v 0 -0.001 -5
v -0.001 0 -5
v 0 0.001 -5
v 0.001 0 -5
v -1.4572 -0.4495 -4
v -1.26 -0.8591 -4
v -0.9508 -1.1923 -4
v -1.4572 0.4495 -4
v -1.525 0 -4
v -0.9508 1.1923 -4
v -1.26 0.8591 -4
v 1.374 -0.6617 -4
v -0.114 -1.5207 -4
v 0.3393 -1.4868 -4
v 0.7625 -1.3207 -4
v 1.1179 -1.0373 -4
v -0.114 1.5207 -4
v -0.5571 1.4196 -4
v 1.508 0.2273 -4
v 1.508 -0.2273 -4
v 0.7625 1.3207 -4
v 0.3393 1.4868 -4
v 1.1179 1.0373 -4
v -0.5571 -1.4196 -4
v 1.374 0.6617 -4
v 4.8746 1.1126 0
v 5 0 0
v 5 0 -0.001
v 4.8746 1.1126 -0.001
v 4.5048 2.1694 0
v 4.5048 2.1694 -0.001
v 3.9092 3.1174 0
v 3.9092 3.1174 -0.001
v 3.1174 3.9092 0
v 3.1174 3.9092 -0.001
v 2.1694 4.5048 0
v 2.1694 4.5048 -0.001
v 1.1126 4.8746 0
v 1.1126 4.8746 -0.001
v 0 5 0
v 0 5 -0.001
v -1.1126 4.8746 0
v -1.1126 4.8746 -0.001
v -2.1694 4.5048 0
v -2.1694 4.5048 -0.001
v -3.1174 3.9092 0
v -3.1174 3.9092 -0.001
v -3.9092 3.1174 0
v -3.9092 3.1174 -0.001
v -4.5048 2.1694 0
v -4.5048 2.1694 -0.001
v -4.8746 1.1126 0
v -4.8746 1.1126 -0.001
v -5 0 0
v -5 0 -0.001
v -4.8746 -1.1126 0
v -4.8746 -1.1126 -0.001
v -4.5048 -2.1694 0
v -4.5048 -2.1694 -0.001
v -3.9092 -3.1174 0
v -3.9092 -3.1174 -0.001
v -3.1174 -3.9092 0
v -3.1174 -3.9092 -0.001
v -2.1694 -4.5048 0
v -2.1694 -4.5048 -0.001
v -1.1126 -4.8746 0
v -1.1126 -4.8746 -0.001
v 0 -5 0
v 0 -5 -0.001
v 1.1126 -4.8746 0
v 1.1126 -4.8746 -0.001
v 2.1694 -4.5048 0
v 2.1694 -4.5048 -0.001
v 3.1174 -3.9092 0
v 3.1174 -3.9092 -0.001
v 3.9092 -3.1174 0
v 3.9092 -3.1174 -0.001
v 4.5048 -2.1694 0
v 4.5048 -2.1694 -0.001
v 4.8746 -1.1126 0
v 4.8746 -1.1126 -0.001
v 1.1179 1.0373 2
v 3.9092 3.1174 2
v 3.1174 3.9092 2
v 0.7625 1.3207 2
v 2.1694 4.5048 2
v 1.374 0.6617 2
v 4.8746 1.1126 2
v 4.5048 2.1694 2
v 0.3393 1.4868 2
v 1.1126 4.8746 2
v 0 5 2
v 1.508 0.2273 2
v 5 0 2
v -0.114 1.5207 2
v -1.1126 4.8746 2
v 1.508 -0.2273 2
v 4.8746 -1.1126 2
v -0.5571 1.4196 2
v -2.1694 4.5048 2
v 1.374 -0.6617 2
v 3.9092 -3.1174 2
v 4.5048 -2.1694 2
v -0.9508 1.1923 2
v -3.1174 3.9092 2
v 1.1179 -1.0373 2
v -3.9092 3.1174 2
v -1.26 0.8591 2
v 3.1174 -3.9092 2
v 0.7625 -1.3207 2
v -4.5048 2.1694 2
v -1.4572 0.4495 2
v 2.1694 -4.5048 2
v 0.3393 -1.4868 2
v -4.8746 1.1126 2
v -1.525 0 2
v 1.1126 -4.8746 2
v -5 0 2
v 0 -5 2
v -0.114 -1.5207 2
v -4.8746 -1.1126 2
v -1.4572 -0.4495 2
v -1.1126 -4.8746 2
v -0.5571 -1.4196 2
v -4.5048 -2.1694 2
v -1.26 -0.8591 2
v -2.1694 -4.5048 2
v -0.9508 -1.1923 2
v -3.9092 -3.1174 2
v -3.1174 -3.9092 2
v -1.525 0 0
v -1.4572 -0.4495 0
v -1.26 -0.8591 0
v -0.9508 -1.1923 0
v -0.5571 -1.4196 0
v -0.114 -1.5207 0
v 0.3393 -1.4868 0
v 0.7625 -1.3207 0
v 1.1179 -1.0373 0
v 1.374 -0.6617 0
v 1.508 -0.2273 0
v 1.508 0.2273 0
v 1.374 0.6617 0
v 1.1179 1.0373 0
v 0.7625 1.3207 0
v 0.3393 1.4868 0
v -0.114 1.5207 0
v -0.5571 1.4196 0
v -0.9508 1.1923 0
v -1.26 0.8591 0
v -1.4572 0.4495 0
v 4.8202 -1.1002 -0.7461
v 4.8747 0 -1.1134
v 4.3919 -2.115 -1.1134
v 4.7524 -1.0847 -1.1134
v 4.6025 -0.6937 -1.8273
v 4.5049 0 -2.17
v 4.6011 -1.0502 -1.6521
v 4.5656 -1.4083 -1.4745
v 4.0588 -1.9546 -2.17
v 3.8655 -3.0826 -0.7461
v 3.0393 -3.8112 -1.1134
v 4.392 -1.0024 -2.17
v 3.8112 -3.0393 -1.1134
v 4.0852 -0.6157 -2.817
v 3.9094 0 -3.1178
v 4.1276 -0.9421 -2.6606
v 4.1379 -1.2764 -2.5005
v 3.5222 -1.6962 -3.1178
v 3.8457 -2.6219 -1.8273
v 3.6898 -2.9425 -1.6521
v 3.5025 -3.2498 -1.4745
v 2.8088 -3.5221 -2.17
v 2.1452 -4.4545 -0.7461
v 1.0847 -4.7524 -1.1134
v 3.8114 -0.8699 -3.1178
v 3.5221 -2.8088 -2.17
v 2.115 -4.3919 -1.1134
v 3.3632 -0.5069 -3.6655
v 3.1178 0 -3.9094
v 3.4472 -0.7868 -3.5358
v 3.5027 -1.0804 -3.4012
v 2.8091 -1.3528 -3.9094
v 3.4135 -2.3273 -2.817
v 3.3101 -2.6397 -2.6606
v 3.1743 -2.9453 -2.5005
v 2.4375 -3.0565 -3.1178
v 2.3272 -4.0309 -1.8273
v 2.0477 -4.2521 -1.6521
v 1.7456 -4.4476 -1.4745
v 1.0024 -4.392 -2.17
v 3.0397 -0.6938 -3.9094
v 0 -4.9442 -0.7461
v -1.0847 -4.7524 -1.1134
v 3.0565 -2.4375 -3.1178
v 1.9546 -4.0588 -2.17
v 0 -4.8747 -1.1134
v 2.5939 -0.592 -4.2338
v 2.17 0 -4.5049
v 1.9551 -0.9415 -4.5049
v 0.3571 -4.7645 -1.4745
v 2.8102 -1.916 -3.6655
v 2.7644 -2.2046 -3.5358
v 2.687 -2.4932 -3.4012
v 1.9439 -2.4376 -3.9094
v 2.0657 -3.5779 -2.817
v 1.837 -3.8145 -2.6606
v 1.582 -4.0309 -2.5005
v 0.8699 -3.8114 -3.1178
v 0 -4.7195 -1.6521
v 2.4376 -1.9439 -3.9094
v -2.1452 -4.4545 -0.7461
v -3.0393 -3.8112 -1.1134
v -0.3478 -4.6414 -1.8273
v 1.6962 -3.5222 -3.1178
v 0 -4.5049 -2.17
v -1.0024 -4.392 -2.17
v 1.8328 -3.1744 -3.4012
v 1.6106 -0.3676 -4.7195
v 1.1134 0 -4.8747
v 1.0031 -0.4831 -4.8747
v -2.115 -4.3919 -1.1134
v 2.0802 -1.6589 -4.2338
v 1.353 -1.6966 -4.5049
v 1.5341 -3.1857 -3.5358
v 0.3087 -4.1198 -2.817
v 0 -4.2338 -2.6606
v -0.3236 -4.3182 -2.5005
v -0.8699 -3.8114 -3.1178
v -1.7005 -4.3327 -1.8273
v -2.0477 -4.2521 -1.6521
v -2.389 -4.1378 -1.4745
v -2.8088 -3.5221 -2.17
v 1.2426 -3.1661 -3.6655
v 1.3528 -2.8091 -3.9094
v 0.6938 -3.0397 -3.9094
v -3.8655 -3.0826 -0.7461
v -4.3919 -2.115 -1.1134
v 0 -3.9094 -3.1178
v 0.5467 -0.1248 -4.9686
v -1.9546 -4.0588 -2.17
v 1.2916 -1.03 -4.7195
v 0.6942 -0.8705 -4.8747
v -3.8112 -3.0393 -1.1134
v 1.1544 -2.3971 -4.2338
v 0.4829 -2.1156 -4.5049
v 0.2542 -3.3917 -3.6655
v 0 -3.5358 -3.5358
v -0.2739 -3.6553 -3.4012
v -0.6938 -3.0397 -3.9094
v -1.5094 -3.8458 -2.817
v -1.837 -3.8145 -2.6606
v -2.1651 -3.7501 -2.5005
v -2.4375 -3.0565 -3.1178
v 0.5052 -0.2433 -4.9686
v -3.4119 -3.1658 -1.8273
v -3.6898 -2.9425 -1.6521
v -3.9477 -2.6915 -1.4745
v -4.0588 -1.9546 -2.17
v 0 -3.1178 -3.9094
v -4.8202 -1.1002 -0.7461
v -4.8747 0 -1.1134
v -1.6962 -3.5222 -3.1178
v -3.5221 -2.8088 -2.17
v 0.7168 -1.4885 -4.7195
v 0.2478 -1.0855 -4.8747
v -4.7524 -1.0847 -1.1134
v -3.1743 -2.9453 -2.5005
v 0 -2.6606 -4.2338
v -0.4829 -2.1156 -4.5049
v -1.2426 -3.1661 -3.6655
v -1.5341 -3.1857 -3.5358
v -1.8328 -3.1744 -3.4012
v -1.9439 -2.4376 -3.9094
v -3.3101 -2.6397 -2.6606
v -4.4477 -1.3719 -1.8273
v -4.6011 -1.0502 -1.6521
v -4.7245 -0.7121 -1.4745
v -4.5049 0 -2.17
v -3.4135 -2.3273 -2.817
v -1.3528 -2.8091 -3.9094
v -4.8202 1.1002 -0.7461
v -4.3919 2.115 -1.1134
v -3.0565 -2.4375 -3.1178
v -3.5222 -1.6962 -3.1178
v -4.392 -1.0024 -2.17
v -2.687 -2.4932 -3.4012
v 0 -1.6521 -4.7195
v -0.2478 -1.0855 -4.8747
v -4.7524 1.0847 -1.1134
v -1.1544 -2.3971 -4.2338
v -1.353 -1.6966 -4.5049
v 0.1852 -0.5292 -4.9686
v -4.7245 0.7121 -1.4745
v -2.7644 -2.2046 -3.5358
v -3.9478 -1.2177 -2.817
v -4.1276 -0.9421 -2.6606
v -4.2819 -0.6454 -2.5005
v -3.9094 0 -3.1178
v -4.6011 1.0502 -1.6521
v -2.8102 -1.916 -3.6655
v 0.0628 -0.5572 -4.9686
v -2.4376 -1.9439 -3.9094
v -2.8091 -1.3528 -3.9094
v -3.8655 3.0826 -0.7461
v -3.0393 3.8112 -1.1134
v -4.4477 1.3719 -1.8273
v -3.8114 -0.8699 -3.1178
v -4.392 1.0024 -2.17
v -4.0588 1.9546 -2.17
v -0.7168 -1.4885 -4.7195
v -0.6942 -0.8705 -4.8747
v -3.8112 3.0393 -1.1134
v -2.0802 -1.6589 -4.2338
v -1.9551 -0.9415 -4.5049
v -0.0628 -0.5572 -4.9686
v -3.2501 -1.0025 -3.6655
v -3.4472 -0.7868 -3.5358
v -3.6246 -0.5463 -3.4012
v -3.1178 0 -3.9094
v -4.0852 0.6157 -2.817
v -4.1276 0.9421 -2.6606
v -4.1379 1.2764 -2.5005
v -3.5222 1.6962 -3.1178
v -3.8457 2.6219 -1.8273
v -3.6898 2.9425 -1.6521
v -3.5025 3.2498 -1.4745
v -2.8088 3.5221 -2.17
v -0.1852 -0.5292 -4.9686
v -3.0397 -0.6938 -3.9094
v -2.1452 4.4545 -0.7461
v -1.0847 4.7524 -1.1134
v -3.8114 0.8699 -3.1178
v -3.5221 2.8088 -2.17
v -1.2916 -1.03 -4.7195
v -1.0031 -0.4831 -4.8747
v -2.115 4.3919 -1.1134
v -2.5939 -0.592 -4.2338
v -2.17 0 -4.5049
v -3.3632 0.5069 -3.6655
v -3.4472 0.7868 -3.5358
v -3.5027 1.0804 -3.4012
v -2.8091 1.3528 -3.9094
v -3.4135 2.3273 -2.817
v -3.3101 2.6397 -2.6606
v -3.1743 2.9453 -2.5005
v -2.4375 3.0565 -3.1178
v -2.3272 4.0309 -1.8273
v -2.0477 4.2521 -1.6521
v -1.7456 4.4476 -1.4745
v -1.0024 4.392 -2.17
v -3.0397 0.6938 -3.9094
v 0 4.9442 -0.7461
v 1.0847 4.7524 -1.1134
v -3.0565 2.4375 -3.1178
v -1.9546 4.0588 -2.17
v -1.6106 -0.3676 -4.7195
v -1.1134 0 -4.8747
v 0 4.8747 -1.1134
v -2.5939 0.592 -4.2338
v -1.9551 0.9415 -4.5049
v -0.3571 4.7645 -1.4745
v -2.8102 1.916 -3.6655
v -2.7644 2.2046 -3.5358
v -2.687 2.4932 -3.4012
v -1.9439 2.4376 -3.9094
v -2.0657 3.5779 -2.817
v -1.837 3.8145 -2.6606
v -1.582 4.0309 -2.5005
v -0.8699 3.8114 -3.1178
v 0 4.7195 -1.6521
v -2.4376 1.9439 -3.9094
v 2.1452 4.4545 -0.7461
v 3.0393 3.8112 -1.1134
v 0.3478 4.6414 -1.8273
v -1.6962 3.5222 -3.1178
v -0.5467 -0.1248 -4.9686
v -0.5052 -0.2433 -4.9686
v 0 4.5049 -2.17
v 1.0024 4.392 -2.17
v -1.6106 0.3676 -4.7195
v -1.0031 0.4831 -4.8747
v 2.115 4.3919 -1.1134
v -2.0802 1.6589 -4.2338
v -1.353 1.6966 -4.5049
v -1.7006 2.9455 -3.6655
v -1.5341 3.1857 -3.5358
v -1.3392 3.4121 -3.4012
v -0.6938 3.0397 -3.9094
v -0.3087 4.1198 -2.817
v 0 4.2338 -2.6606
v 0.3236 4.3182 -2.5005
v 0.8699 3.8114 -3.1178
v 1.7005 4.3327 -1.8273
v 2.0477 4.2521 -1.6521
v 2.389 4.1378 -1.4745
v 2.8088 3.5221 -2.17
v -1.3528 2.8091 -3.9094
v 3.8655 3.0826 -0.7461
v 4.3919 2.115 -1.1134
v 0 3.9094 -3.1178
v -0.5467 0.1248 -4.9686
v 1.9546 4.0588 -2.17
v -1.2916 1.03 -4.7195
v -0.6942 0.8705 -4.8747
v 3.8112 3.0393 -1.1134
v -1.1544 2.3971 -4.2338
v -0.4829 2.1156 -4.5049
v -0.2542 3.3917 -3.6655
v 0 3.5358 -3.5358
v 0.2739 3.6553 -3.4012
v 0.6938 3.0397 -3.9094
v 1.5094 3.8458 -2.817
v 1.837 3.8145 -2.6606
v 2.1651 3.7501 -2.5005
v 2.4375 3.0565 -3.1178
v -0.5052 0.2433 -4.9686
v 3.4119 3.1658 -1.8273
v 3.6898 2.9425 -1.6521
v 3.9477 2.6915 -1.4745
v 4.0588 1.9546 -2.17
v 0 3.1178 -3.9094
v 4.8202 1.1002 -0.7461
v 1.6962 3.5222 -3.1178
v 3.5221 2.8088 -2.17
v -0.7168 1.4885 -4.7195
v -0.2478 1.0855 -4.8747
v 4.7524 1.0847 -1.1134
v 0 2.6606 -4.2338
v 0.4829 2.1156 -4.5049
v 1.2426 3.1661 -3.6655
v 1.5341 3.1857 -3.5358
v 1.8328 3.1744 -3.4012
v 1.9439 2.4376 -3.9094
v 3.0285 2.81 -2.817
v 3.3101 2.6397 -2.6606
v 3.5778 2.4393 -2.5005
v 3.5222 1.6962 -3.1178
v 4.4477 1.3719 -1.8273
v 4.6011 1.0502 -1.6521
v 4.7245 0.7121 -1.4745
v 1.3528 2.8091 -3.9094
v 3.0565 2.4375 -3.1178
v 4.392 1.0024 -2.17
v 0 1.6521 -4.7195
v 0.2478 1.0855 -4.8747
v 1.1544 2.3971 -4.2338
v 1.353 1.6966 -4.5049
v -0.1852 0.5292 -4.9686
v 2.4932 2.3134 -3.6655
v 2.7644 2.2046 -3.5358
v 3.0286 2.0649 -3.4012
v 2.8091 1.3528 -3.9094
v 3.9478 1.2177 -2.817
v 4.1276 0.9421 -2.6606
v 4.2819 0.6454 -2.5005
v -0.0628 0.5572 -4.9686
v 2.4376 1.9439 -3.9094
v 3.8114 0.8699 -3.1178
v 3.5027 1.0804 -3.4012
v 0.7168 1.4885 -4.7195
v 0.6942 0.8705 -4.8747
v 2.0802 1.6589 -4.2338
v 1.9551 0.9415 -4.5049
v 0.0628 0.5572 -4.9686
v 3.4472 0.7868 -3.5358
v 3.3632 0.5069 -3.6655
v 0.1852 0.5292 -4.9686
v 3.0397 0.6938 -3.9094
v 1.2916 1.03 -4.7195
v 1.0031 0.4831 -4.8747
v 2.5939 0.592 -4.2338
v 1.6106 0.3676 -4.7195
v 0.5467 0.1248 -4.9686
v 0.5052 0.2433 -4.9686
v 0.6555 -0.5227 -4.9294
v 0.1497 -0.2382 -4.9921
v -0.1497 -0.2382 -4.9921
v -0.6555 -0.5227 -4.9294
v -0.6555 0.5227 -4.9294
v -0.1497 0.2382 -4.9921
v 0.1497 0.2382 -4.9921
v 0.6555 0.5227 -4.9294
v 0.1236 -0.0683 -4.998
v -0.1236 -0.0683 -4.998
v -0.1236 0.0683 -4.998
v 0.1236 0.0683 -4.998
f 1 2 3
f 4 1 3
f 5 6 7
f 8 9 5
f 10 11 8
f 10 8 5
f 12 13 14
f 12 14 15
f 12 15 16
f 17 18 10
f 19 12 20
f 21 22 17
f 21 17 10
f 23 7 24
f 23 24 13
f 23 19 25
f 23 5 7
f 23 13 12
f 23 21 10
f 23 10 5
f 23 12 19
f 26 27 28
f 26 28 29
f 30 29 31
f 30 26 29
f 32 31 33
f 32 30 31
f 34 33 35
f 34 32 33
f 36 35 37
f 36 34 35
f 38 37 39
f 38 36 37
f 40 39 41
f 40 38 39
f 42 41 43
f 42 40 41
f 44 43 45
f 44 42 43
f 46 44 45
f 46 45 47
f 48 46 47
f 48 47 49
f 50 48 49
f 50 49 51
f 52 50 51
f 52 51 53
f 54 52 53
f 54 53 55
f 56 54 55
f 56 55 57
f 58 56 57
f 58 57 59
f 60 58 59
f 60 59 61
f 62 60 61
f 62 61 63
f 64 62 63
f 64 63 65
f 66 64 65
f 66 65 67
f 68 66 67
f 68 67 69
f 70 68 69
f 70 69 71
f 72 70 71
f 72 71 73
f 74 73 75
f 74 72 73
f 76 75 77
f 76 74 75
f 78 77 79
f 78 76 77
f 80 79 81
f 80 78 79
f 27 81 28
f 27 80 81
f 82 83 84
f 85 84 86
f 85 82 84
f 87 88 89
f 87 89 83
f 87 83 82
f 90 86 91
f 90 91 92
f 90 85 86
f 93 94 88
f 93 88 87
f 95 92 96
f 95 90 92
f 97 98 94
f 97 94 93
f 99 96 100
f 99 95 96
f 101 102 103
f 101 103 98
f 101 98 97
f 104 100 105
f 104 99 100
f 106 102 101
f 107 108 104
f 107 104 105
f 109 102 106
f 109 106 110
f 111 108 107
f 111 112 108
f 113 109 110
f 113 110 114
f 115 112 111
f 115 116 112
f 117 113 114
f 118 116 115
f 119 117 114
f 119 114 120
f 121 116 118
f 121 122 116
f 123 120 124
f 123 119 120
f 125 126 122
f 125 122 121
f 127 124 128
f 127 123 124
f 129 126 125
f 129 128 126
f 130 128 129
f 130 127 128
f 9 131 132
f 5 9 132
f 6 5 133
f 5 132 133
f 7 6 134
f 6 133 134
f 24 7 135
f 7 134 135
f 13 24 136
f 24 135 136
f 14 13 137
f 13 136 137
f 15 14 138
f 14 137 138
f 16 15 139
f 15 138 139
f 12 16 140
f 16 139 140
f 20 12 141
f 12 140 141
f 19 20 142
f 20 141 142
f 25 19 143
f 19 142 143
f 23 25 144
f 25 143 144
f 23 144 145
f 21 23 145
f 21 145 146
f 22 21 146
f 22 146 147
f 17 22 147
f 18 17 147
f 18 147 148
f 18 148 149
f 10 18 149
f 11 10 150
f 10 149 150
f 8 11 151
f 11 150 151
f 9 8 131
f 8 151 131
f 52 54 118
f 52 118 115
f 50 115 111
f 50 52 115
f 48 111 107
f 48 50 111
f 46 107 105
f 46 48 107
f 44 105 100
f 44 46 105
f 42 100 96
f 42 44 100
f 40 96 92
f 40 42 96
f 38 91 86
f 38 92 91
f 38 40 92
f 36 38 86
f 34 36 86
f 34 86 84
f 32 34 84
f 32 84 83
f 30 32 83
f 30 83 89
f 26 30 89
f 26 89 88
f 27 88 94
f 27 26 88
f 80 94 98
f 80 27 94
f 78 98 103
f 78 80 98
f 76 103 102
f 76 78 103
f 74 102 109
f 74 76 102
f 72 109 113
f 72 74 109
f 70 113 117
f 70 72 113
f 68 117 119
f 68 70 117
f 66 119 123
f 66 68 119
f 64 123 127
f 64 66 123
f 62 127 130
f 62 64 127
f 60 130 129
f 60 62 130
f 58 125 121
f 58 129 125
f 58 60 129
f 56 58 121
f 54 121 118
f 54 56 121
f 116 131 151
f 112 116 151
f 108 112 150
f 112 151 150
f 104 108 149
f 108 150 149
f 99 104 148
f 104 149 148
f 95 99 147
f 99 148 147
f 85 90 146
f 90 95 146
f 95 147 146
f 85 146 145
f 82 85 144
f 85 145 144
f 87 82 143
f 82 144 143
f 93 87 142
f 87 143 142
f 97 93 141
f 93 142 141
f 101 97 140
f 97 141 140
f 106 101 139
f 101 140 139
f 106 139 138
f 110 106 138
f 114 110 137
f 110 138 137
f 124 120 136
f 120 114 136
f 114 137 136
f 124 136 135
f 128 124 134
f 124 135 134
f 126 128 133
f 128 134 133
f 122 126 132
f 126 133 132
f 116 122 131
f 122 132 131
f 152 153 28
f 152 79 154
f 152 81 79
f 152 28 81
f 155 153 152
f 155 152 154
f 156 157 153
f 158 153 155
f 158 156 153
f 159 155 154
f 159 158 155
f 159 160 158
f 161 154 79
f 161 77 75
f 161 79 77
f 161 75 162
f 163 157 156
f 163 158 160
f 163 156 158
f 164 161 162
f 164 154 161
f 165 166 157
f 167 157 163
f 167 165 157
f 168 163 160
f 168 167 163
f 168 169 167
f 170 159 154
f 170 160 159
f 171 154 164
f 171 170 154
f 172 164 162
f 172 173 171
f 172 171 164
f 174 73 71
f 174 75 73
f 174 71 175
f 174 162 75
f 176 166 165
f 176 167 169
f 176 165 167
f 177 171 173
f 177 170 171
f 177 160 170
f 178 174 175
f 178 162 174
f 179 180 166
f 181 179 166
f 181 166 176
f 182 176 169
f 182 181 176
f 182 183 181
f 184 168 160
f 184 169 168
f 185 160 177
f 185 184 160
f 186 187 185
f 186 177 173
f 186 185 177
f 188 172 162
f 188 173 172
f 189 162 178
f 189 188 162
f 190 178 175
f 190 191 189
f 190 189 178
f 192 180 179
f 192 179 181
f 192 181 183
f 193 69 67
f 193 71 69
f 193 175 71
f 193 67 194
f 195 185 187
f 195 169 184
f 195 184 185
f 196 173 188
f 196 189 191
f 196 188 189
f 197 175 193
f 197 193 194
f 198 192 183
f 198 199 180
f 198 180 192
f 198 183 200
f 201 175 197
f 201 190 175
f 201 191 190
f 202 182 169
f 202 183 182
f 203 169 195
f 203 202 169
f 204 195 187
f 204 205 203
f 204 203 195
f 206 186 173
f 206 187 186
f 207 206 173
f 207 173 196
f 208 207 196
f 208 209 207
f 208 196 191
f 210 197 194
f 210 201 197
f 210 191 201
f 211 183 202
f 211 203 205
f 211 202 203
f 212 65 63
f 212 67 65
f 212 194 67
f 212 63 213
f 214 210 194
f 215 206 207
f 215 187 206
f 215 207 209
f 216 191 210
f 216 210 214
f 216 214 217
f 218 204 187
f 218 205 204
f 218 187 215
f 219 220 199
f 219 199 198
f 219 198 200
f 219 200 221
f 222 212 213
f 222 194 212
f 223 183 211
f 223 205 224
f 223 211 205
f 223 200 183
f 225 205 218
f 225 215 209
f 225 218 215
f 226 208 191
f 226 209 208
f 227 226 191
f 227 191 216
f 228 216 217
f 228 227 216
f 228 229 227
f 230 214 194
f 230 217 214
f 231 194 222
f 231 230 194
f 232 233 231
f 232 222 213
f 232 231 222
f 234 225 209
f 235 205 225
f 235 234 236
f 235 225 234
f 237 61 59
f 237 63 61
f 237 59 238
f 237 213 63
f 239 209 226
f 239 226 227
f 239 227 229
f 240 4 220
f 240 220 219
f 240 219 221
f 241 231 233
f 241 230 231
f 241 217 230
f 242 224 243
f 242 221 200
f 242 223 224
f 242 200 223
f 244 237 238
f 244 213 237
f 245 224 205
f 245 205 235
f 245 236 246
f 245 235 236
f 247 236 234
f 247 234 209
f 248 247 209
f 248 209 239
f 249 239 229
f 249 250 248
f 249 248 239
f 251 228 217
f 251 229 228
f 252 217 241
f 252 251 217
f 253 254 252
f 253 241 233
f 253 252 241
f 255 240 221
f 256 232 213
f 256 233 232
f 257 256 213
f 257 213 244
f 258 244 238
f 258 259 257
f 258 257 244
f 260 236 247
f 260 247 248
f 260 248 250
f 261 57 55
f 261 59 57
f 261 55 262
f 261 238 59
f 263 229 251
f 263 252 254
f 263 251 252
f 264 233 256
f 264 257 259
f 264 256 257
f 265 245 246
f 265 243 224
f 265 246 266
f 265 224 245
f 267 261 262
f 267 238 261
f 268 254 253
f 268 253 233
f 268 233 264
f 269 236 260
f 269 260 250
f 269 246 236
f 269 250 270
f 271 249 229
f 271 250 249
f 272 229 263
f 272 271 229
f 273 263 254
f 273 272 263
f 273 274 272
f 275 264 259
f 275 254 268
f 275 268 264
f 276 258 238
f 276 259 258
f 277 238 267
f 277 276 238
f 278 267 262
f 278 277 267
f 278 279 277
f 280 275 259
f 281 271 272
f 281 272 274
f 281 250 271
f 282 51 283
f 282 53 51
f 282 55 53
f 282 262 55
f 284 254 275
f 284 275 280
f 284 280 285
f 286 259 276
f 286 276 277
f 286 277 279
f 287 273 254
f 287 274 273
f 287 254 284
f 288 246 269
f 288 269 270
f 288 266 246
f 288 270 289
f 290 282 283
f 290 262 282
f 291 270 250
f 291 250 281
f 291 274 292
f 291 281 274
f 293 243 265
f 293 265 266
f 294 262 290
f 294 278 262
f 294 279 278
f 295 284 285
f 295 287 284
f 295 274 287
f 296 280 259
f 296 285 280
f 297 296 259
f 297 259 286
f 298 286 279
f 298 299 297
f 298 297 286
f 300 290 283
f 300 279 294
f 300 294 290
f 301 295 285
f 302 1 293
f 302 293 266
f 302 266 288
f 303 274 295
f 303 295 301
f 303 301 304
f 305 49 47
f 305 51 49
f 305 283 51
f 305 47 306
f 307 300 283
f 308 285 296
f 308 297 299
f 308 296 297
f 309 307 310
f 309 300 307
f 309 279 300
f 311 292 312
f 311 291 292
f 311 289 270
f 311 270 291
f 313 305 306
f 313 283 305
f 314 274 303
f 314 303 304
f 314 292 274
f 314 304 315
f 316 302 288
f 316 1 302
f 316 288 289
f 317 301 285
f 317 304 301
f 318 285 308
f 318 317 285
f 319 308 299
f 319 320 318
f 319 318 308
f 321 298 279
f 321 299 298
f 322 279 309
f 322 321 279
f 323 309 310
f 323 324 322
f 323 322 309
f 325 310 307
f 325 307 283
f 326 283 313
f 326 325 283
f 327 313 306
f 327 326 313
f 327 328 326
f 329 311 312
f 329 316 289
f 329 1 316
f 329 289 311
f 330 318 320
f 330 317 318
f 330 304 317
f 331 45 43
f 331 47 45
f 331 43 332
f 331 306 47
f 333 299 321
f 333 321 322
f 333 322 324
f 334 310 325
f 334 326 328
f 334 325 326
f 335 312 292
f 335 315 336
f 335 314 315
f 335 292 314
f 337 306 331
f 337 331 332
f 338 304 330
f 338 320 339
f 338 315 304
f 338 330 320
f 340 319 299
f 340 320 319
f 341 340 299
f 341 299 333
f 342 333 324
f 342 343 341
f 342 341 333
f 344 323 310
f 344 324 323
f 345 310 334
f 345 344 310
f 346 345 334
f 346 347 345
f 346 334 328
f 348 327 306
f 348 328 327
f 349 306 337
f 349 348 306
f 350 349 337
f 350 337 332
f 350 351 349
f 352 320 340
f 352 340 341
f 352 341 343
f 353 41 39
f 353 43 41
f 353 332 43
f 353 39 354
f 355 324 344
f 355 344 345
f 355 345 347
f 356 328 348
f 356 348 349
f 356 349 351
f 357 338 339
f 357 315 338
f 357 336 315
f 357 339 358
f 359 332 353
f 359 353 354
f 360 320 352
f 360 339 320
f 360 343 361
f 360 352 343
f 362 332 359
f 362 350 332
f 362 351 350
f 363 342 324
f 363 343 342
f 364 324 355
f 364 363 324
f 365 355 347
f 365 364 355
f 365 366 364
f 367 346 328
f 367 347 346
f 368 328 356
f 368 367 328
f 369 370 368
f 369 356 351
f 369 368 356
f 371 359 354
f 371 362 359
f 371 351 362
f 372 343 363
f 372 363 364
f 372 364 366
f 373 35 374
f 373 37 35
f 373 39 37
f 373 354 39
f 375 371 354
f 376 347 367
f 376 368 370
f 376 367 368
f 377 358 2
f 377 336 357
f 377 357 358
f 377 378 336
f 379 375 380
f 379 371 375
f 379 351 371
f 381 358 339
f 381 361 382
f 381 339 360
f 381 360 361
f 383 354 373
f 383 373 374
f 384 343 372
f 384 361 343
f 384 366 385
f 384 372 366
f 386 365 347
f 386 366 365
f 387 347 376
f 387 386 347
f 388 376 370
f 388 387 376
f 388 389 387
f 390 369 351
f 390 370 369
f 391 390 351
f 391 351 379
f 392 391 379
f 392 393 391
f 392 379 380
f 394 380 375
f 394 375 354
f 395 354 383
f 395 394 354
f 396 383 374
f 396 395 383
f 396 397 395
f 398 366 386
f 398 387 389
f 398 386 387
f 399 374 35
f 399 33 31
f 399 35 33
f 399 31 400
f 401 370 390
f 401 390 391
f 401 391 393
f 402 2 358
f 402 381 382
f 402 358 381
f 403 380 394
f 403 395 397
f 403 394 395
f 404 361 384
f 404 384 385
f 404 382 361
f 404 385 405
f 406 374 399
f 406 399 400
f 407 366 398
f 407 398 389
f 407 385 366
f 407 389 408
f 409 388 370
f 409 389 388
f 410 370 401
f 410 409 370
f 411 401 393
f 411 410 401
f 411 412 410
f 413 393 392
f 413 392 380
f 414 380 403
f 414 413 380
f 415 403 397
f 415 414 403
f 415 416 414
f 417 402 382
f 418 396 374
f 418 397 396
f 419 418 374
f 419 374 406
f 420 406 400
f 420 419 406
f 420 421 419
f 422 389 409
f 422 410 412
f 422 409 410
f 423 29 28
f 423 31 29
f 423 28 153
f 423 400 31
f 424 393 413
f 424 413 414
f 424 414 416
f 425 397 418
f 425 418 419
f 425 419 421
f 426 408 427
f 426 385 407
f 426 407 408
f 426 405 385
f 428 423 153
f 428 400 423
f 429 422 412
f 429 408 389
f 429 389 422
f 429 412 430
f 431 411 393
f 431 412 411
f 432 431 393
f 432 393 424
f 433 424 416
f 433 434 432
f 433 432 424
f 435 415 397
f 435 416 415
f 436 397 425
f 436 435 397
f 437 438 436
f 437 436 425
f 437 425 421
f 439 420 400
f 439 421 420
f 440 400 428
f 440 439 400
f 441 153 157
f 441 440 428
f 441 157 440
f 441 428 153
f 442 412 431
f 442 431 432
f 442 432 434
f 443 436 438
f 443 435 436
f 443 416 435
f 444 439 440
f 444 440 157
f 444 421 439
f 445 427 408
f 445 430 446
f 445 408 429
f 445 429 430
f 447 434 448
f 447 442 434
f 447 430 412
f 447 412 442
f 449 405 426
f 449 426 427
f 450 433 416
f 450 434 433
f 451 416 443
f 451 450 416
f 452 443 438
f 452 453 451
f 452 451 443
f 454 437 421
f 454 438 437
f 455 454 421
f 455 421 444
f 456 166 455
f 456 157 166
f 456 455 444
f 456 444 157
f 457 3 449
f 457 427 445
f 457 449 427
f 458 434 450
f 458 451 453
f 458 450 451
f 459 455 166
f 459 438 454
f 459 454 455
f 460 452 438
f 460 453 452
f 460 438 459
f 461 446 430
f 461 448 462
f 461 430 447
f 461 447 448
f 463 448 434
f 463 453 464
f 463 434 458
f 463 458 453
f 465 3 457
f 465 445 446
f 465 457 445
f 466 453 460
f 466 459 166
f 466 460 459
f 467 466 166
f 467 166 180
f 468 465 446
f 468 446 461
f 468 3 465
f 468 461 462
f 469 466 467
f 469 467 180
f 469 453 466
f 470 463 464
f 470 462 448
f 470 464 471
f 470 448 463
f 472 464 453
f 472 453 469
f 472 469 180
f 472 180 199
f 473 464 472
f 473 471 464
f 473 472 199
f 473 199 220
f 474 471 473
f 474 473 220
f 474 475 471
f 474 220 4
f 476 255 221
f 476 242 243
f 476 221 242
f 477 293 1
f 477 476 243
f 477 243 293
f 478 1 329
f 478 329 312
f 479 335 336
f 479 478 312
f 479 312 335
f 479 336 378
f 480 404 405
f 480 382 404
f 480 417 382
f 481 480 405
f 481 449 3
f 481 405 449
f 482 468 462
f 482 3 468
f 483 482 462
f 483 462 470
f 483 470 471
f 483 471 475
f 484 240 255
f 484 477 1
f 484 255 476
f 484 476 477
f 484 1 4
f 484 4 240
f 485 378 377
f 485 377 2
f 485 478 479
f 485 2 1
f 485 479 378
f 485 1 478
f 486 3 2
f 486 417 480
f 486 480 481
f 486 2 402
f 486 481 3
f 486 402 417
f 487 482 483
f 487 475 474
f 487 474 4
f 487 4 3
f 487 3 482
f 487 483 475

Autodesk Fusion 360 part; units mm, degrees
sketch "Skizze1" plane through (0, 0, 0) normal (0, 0, 1) x (1, 0, 0)
sketch "Skizze2" plane through (0, 0, 0) normal (0, 0, 1) x (1, 0, 0)
  circle A0 centre (0, 0) radius 5
extrude "Extrusion1" add sketch "Skizze2" against normal blind 5
fillet "Abrundung1" radius 5 1 edges at (-4.6616, 1.8081, -5)
sketch "Skizze3" plane through (0, 0, 0) normal (0, 0, 1) x (-1, 0, 0)
  circle A0 centre (0, 0) radius 5
  circle A1 centre (0, 0) radius 1.525
  dimension "d5" = 3.05
extrude "Extrusion2" add sketch "Skizze3" along normal blind 2
extrude "Extrusion3" cut 1 faces at (0.5137, -0.5901, 0) along direction (0, 0, -1) blind 4
